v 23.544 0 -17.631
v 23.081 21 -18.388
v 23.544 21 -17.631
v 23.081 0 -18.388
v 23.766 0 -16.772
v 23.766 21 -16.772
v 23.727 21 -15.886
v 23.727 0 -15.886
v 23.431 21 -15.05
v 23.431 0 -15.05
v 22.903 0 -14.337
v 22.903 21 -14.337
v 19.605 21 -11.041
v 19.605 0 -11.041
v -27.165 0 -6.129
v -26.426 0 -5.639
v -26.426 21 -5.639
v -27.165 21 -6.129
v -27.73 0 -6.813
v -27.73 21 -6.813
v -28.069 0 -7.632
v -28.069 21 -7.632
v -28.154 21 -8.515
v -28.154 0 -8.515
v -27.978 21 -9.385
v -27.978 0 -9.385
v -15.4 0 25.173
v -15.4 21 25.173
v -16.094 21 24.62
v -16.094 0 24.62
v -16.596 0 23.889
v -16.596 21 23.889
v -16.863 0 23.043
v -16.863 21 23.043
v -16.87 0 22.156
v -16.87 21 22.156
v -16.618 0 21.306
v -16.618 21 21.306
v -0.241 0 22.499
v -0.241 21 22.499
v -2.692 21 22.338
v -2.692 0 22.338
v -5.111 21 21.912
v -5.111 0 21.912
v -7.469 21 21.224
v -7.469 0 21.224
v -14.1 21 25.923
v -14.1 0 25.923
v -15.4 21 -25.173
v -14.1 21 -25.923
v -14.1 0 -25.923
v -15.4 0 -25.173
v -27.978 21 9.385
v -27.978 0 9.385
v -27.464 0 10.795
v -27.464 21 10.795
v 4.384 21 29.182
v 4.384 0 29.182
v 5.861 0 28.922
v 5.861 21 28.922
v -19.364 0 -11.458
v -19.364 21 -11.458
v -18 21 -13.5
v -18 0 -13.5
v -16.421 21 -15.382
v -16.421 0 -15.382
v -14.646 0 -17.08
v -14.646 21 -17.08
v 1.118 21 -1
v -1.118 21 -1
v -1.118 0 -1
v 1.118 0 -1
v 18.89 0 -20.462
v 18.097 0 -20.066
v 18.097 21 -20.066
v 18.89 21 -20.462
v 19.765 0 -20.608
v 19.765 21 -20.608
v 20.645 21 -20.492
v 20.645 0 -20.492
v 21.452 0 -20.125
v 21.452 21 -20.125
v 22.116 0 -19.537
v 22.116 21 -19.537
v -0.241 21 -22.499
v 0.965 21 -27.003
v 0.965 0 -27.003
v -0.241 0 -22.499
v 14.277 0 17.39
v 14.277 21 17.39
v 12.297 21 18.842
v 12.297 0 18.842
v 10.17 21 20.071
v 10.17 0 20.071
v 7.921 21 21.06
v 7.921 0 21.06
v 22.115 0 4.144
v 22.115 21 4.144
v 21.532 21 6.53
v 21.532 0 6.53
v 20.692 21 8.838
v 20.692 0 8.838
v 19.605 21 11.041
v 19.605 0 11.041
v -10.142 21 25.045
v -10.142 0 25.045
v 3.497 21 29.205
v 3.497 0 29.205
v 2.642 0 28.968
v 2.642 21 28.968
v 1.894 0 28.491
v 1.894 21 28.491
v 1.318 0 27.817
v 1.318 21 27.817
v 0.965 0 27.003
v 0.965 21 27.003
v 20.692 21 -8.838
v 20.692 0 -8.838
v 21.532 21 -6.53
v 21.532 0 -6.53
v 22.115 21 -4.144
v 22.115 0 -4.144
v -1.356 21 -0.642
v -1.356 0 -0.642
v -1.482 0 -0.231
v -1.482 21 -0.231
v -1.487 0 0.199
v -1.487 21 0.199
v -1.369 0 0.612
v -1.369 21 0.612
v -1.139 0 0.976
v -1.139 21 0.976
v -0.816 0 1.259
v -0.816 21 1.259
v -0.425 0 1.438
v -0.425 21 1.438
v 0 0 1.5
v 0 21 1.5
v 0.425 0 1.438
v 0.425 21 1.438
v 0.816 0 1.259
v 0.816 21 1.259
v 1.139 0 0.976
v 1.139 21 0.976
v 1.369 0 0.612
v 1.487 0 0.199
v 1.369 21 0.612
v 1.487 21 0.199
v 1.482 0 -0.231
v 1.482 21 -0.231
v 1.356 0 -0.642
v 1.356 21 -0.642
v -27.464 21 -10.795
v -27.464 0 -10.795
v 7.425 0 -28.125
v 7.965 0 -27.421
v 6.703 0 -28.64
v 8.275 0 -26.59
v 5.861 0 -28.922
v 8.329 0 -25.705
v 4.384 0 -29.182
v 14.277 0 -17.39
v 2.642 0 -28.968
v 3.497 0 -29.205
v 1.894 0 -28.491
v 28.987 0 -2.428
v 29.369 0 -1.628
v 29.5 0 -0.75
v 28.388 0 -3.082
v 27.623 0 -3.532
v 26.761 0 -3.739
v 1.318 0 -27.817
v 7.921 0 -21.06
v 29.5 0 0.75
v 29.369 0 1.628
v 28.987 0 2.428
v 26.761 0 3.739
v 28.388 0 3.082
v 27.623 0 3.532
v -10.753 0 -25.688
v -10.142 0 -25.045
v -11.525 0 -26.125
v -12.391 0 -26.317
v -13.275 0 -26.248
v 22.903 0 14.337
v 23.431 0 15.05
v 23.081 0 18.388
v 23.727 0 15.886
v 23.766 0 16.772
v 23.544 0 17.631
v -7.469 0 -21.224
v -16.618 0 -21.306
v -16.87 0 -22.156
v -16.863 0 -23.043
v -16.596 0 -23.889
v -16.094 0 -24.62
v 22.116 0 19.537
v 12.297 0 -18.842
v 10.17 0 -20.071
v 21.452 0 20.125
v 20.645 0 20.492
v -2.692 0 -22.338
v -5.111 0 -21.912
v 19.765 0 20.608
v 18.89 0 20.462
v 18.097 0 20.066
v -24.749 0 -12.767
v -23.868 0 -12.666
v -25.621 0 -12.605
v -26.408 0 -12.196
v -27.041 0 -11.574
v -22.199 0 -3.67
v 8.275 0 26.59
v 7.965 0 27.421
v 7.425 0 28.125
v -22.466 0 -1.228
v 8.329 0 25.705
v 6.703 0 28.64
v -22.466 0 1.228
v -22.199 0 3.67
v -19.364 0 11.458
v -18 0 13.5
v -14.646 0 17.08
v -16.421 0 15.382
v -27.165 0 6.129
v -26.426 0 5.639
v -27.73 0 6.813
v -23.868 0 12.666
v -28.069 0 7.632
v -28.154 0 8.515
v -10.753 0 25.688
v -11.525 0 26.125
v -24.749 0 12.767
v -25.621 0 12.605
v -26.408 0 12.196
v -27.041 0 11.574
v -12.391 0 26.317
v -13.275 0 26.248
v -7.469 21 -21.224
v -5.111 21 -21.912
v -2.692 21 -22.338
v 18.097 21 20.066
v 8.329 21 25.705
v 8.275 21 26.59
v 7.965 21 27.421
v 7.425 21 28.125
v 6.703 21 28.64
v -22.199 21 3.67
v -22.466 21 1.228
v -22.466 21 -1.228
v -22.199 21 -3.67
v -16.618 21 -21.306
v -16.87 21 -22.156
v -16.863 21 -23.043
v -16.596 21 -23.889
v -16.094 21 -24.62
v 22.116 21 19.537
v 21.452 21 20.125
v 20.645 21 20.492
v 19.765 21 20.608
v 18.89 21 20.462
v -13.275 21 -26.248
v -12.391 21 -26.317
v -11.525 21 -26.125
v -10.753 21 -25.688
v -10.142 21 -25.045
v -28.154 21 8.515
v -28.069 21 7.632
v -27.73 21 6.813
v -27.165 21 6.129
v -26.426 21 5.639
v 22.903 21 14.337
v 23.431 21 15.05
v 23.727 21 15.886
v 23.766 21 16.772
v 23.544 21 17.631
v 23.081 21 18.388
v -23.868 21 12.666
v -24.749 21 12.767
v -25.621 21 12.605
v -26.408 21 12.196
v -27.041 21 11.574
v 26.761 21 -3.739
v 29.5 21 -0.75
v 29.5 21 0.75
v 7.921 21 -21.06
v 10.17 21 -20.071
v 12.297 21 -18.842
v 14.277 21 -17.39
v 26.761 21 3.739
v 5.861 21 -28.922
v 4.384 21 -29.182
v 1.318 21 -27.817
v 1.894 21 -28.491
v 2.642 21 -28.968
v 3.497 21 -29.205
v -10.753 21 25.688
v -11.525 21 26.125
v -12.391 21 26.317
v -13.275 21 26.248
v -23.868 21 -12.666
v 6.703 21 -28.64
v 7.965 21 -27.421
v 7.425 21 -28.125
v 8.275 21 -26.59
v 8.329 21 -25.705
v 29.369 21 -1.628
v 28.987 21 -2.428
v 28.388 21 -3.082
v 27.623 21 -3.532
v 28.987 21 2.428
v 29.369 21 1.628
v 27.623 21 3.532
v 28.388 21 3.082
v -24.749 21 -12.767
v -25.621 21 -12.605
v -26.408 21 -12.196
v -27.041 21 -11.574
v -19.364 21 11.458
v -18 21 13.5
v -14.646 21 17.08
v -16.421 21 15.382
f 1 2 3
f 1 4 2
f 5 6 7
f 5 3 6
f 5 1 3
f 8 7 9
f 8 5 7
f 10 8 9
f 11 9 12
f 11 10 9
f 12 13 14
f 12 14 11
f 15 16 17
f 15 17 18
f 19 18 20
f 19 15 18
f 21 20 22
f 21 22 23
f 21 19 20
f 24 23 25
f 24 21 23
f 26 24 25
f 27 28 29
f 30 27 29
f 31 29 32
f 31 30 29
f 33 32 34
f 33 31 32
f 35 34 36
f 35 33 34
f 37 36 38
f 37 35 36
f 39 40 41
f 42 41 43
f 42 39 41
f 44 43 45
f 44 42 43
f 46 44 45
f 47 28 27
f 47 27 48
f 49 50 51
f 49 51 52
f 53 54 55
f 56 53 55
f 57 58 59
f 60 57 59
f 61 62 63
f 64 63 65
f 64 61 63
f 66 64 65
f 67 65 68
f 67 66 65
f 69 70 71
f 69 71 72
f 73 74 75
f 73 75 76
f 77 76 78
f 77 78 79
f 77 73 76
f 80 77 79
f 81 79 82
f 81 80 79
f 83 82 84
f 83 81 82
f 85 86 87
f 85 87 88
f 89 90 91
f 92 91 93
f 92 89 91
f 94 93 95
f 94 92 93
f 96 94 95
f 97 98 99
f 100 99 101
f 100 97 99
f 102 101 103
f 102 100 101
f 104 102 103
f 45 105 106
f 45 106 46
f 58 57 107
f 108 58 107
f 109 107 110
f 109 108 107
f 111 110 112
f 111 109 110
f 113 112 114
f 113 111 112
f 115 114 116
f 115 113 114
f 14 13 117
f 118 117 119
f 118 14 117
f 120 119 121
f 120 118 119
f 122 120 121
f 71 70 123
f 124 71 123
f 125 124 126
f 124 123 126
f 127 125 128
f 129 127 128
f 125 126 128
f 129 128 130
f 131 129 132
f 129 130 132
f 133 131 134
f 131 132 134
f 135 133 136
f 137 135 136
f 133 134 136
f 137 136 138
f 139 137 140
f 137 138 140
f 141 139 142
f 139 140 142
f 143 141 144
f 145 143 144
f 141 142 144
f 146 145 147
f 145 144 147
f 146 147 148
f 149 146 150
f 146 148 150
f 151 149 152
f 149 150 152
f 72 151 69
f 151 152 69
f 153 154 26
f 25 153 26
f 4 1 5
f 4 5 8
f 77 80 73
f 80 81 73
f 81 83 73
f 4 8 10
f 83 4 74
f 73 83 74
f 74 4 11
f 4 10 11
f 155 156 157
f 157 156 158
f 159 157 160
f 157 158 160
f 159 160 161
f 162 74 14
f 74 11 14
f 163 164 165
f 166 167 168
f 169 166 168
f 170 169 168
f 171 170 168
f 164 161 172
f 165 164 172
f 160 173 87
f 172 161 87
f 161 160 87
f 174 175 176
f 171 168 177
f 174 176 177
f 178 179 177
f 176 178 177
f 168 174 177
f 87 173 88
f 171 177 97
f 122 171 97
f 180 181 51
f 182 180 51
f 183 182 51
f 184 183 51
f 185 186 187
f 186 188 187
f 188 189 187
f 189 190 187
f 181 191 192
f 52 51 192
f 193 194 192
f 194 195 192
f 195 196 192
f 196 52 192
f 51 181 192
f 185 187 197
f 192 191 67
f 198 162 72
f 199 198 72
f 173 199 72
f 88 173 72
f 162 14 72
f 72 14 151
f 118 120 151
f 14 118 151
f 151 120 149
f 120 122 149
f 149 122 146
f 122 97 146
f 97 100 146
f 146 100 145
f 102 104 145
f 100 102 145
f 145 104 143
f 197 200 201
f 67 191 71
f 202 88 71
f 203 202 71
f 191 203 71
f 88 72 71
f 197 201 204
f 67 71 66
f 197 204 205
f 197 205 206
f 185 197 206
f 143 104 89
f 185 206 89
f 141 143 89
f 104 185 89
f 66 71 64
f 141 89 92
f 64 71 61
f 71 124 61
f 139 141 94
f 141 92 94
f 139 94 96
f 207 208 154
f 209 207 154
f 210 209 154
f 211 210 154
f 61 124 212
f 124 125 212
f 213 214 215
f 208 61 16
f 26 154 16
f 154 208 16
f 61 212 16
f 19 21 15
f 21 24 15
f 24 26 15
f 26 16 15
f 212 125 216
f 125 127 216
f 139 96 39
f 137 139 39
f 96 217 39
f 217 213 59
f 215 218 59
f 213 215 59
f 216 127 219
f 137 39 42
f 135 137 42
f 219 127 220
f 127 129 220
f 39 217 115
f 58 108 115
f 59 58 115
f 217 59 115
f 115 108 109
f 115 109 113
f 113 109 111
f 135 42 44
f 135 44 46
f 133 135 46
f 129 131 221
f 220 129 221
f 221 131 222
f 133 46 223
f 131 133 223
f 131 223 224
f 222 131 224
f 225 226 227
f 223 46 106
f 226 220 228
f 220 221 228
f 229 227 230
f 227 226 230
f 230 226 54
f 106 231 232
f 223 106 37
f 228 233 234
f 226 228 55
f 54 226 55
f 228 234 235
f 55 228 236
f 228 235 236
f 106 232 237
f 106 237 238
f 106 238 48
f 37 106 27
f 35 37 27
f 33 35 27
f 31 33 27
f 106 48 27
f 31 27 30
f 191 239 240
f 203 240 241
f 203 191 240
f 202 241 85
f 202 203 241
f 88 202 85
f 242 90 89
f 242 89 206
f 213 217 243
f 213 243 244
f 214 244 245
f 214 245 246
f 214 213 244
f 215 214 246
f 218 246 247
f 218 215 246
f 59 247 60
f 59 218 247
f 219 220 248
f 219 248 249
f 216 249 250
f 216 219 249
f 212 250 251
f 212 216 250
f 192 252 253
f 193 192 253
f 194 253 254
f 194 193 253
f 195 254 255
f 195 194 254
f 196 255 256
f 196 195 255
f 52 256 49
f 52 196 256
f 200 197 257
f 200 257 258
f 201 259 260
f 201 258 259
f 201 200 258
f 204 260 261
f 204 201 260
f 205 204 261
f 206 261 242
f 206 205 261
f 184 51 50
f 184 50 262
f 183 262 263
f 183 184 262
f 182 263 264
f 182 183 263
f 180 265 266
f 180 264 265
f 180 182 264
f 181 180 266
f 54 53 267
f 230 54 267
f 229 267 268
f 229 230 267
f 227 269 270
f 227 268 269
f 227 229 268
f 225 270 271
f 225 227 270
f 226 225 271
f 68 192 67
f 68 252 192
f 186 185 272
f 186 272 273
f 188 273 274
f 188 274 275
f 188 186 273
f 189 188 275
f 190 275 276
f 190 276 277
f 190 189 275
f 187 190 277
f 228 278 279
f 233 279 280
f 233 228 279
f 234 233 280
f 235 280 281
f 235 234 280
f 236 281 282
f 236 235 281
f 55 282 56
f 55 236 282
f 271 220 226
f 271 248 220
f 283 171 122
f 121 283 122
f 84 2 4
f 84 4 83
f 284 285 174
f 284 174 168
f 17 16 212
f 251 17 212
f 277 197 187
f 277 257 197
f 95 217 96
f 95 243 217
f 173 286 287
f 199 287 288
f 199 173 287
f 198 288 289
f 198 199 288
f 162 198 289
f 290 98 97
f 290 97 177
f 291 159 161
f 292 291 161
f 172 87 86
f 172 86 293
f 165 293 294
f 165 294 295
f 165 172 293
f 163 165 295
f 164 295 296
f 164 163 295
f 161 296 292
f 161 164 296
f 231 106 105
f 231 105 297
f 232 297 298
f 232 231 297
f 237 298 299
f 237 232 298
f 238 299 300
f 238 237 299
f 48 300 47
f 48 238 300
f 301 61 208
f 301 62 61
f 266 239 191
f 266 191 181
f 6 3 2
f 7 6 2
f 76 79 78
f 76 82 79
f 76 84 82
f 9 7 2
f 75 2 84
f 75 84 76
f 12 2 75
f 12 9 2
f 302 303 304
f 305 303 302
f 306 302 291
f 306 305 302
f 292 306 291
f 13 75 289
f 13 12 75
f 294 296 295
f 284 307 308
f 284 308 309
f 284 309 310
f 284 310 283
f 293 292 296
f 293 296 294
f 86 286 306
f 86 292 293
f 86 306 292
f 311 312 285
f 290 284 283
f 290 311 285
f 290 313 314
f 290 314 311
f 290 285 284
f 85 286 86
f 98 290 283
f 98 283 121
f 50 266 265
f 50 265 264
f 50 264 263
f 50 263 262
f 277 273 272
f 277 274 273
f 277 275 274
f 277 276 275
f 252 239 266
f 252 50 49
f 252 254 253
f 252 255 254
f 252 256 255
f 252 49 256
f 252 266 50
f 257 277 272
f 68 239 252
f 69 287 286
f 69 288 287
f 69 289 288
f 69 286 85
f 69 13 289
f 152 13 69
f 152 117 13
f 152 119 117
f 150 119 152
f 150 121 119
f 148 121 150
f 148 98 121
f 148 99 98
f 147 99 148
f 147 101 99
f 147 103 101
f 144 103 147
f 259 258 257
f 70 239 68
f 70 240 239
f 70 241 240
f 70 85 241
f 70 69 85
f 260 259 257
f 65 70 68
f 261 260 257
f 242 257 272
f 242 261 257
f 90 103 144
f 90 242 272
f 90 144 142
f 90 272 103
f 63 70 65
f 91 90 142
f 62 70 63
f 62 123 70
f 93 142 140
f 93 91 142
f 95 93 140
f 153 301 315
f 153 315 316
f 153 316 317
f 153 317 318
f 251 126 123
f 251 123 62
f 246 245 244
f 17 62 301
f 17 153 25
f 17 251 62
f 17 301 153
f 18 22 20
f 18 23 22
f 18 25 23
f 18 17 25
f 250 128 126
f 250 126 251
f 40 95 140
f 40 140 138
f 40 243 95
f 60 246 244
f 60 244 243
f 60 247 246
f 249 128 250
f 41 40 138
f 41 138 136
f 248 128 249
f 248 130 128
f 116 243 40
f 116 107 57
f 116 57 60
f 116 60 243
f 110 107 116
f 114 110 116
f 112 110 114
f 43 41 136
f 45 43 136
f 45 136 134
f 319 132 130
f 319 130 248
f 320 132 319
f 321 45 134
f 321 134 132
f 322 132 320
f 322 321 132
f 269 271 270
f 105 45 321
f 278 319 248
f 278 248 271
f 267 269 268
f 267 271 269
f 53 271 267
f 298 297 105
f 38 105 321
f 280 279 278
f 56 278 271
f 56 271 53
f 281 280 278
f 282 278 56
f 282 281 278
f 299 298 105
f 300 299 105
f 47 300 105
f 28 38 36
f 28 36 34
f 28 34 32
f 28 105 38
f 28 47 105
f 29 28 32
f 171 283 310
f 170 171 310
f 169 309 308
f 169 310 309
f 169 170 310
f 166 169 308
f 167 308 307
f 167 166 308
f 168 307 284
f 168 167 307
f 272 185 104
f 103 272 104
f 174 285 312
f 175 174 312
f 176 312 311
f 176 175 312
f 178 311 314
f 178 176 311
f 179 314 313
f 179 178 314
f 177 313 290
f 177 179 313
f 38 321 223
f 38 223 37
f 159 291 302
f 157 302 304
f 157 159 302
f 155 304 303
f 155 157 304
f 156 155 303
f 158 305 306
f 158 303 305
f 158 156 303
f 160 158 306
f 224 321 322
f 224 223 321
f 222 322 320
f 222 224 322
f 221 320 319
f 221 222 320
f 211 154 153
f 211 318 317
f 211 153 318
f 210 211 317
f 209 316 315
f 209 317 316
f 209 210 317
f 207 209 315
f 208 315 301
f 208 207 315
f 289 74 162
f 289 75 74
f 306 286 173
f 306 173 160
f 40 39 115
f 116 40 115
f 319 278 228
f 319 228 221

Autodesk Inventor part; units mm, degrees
ref_plane "YZ Plane" through (0, 0, 0) normal (1, 0, 0) x (0, 1, 0)
ref_plane "XZ Plane" through (0, 0, 0) normal (0, 1, 0) x (-1, 0, 0)
ref_plane "XY Plane" through (0, 0, 0) normal (0, 0, 1) x (1, 0, 0)
sketch "Szkic1" plane through (0, 0, 0) normal (0, 1, 0) x (-1, 0, 0)
  circle A0 centre (0, 0) radius 22.5
  dimension "d0" = 45
extrude "Wyciągnięcie proste1" add sketch "Szkic1" along normal blind 21
sketch "Szkic2" plane through (0, 21, 0) normal (0, 1, 0) x (1, 0, 0)
  circle A0 centre (0, 0) radius 22.5 projected
  line L0 (22.1151, -4.144) -> (29.5, -3.5)
  line L1 (29.5, -3.5) -> (29.5, 3.5)
  line L2 (29.5, 3.5) -> (22.1151, 4.144)
  line L3 (22.1151, -4.144) -> (22.1151, 4.144)
  dimension "d3" = 7
  dimension "d4" = 7
extrude "Wyciągnięcie proste2" add sketch "Szkic2" against normal blind 21 contours A0 L2 L1 L0
fillet "Zaokrąglenie1" radius 3 2 edges at (29.5, 10.5, -3.5) (29.5, 10.5, 3.5)
pattern_circular "Szyk kołowy2" count 9 over 360 about axis through (0, 0, 0) along (0, 1, 0) of "Wyciągnięcie proste2", "Zaokrąglenie1"
sketch "Szkic3" plane through (0, 0, 0) normal (0, -1, 0) x (1, 0, 0)
  point P0 (0, 0)
sketch "Szkic4" plane through (0, 21, 0) normal (0, 1, 0) x (1, 0, 0)
  circle A0 centre (0, 0) radius 1.5
  line L0 (-1.118, 1) -> (1.118, 1)
  circle A1 centre (0, 0) radius 2
  dimension "d14" = 3
  dimension "d15" = 2.5
  dimension "d16" = 0
  dimension "d17" = 0
extrude "Wyciągnięcie proste3" cut sketch "Szkic4" against normal through all contours A0 L0 picked at (0.0594, 0.1702)
properties part number "KOŁO"
